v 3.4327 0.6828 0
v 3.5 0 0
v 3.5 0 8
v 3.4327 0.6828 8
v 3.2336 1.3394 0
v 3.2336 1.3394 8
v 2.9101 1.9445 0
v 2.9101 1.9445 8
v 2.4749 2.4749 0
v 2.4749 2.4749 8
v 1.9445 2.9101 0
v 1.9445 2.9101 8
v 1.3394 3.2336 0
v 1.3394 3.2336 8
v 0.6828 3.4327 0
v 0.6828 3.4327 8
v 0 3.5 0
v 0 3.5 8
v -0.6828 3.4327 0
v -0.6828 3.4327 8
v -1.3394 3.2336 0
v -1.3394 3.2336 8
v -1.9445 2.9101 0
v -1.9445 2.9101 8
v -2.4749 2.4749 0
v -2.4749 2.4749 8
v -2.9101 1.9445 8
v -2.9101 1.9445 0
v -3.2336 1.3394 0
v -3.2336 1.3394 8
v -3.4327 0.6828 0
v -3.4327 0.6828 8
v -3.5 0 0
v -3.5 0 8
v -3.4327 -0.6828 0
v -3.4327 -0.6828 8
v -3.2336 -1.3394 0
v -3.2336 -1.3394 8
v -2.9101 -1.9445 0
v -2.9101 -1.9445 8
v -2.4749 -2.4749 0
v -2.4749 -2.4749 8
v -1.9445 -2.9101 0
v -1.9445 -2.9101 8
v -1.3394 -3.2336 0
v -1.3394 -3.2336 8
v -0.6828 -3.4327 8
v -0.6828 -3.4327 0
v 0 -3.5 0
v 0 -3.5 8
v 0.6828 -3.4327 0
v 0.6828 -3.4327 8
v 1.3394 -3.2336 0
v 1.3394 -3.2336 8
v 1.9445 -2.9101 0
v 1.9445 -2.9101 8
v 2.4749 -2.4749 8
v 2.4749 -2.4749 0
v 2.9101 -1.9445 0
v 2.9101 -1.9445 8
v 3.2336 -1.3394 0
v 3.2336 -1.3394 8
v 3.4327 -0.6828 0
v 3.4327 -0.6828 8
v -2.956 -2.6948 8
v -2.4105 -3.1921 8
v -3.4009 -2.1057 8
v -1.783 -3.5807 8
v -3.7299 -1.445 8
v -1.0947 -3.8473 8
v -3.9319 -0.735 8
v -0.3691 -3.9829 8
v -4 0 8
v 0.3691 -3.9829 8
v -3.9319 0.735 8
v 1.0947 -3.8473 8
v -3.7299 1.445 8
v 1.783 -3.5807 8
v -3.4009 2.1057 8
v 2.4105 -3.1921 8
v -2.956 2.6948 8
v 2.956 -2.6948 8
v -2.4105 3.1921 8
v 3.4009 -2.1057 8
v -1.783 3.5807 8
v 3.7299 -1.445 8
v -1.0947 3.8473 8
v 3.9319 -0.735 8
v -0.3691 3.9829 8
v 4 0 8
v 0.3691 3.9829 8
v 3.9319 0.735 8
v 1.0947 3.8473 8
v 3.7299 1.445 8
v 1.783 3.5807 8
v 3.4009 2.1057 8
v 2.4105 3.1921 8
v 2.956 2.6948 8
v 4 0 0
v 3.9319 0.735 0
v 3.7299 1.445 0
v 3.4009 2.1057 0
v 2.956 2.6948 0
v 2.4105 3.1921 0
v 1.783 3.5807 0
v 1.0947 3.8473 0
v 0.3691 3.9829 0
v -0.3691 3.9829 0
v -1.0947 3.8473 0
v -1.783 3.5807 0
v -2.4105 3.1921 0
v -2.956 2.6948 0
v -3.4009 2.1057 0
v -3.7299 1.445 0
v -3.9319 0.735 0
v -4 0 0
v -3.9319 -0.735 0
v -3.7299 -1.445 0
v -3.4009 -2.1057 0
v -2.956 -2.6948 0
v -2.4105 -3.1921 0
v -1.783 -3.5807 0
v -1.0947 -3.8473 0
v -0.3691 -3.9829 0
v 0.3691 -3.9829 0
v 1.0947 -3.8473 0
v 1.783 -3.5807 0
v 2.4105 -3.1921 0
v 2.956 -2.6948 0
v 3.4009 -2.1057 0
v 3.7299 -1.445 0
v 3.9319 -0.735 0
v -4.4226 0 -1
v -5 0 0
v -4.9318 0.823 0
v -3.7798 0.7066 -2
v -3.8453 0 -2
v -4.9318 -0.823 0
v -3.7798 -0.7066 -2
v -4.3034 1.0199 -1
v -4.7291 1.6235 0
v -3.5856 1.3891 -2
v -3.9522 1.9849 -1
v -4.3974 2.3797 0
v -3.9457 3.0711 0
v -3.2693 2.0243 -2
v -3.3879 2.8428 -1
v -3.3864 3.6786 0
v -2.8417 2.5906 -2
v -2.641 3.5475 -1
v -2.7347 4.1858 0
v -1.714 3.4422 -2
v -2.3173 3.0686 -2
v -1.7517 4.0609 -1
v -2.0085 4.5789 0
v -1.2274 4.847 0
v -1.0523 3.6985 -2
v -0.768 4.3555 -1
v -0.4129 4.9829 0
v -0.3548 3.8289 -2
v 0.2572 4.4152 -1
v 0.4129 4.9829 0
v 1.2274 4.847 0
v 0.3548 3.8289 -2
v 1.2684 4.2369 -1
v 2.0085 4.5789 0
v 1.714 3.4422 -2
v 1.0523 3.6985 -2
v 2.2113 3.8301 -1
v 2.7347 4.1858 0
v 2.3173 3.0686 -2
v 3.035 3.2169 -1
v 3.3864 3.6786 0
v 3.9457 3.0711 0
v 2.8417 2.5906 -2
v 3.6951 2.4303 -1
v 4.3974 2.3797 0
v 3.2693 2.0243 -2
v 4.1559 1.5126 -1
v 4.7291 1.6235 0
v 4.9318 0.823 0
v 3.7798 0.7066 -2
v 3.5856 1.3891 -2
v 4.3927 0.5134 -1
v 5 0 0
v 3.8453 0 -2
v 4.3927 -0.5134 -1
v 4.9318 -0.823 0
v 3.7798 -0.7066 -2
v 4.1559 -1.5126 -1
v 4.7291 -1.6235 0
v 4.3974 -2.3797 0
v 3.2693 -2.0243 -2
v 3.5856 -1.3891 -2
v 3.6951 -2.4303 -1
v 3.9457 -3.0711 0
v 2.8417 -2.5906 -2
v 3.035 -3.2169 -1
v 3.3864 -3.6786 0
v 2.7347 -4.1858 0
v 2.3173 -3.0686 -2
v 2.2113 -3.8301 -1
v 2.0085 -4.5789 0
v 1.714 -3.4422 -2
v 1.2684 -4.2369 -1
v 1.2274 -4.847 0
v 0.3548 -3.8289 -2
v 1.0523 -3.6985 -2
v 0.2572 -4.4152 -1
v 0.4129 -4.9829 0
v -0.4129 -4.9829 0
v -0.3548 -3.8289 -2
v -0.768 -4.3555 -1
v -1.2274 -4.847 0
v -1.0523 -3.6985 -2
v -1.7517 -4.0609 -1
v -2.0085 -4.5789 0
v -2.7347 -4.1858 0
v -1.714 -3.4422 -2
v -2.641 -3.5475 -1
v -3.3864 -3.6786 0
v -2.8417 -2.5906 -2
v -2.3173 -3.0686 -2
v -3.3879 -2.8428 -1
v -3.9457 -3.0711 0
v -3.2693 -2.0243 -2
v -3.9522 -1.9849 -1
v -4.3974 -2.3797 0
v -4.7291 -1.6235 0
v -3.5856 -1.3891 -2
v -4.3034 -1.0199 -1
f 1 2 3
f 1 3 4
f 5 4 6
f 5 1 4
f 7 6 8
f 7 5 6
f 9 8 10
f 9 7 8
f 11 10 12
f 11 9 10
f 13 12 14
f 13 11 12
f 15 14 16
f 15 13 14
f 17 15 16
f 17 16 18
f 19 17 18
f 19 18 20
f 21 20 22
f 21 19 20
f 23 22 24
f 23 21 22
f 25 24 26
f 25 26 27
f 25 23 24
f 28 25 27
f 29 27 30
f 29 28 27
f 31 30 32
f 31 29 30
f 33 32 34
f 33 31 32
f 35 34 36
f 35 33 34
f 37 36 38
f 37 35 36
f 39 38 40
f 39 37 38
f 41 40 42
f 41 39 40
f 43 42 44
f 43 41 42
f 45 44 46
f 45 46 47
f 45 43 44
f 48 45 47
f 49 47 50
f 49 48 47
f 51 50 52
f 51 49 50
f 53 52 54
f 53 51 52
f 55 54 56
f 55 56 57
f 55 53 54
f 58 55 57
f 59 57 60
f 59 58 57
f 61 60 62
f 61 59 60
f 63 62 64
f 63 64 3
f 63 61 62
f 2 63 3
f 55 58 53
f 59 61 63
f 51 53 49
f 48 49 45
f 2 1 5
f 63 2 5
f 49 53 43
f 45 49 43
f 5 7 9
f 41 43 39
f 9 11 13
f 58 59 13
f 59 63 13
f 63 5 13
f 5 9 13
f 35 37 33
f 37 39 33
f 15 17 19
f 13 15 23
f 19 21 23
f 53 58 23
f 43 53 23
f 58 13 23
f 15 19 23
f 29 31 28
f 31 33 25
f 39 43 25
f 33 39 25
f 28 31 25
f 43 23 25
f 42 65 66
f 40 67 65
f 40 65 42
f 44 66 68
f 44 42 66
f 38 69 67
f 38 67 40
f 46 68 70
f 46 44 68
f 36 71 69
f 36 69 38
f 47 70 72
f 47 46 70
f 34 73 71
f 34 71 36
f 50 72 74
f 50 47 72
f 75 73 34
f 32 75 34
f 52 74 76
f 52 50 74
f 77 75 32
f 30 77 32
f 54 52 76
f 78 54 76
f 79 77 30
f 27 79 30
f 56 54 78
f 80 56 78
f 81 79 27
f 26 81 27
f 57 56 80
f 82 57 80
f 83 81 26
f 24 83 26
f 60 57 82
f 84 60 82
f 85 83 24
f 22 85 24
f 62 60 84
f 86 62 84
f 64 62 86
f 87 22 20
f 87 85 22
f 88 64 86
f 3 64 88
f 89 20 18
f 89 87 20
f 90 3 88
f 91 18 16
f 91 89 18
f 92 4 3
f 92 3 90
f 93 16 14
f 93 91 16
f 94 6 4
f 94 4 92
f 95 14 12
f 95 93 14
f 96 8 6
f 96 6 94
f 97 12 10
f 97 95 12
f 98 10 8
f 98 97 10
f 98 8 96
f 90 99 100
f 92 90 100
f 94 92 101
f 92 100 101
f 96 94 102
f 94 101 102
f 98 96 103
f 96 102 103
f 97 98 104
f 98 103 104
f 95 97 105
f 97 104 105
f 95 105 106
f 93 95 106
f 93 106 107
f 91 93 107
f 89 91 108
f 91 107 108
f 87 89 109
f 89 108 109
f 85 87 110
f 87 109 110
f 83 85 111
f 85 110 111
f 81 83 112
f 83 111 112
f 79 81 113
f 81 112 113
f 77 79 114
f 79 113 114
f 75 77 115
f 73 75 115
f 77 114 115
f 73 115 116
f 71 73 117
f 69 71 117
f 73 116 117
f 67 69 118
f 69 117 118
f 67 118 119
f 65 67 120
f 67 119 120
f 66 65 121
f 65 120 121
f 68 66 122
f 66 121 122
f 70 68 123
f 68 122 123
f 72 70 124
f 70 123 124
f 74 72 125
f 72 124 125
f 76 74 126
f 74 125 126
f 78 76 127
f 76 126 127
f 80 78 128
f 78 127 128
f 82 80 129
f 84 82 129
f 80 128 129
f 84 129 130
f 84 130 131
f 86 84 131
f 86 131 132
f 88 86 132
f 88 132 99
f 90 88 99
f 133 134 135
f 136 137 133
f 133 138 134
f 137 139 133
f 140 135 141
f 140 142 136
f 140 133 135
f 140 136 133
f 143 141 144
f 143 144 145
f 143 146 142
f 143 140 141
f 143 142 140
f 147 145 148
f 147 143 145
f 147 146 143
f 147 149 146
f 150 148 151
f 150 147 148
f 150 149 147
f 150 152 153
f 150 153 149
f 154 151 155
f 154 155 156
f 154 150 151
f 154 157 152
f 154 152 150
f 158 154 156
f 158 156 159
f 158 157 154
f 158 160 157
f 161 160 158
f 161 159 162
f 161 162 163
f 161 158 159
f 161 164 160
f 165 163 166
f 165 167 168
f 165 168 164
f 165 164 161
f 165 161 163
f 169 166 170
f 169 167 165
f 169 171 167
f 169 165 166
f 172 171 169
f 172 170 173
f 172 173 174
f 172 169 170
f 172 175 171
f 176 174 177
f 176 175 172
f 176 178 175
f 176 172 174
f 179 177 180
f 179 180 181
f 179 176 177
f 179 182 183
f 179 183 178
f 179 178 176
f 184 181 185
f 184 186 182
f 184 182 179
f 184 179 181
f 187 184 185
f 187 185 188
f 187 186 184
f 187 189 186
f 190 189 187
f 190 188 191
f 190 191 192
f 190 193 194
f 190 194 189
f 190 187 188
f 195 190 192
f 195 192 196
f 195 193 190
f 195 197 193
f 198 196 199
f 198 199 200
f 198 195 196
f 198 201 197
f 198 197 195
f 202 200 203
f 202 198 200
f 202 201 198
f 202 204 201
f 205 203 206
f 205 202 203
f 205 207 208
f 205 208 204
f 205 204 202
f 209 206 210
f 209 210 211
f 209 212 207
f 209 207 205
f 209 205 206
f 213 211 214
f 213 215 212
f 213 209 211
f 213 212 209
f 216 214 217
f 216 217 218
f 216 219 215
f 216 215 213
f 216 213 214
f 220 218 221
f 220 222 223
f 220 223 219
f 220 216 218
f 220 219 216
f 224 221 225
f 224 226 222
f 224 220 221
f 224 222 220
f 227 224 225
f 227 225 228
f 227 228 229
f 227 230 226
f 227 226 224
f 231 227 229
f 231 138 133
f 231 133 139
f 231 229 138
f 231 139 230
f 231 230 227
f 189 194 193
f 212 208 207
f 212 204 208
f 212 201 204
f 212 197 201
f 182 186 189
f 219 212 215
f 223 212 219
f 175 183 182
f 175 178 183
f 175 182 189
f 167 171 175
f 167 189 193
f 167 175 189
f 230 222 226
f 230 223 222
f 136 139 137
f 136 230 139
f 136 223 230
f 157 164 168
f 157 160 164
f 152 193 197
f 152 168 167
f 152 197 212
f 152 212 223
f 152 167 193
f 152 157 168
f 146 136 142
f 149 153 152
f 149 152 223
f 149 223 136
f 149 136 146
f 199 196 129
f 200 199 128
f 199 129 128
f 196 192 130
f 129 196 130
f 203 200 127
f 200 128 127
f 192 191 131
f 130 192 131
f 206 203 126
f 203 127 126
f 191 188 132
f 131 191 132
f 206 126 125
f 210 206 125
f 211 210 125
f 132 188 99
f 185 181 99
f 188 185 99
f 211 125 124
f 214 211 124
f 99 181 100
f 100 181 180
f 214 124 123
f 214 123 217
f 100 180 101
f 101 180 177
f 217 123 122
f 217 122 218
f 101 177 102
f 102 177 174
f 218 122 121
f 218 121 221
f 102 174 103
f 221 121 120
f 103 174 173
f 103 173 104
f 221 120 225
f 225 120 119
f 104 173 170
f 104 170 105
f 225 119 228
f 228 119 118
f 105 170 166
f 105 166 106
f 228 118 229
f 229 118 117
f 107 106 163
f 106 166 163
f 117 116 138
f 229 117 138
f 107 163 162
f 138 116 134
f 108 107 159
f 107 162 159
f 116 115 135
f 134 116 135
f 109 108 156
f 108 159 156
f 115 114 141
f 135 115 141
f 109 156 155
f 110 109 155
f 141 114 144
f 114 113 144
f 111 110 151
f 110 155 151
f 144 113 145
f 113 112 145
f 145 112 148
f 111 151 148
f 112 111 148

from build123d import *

# Parameters (mm, degrees)
SKETCH2_R           = 4
SKETCH2_R_2         = 3.5
BOSS_EXTRUDE1_DEPTH = 8
SKETCH3_R           = 5
BOSS_EXTRUDE2_DEPTH = 2
BOSS_EXTRUDE2_TAPER = 30


with BuildPart() as part:
    # Sketch2 → Boss-Extrude1 (new body)
    with BuildSketch(Plane.XY):
        Circle(SKETCH2_R)
        Circle(SKETCH2_R_2, mode=Mode.SUBTRACT)
    extrude(amount=BOSS_EXTRUDE1_DEPTH)

    # Sketch3 → Boss-Extrude2 (add)
    with BuildSketch(Plane(origin=(0, 0, 0), x_dir=(-1, 0, 0), z_dir=(0, 0, -1))):
        Circle(SKETCH3_R)
    extrude(amount=BOSS_EXTRUDE2_DEPTH, taper=BOSS_EXTRUDE2_TAPER)


solid = part.part
